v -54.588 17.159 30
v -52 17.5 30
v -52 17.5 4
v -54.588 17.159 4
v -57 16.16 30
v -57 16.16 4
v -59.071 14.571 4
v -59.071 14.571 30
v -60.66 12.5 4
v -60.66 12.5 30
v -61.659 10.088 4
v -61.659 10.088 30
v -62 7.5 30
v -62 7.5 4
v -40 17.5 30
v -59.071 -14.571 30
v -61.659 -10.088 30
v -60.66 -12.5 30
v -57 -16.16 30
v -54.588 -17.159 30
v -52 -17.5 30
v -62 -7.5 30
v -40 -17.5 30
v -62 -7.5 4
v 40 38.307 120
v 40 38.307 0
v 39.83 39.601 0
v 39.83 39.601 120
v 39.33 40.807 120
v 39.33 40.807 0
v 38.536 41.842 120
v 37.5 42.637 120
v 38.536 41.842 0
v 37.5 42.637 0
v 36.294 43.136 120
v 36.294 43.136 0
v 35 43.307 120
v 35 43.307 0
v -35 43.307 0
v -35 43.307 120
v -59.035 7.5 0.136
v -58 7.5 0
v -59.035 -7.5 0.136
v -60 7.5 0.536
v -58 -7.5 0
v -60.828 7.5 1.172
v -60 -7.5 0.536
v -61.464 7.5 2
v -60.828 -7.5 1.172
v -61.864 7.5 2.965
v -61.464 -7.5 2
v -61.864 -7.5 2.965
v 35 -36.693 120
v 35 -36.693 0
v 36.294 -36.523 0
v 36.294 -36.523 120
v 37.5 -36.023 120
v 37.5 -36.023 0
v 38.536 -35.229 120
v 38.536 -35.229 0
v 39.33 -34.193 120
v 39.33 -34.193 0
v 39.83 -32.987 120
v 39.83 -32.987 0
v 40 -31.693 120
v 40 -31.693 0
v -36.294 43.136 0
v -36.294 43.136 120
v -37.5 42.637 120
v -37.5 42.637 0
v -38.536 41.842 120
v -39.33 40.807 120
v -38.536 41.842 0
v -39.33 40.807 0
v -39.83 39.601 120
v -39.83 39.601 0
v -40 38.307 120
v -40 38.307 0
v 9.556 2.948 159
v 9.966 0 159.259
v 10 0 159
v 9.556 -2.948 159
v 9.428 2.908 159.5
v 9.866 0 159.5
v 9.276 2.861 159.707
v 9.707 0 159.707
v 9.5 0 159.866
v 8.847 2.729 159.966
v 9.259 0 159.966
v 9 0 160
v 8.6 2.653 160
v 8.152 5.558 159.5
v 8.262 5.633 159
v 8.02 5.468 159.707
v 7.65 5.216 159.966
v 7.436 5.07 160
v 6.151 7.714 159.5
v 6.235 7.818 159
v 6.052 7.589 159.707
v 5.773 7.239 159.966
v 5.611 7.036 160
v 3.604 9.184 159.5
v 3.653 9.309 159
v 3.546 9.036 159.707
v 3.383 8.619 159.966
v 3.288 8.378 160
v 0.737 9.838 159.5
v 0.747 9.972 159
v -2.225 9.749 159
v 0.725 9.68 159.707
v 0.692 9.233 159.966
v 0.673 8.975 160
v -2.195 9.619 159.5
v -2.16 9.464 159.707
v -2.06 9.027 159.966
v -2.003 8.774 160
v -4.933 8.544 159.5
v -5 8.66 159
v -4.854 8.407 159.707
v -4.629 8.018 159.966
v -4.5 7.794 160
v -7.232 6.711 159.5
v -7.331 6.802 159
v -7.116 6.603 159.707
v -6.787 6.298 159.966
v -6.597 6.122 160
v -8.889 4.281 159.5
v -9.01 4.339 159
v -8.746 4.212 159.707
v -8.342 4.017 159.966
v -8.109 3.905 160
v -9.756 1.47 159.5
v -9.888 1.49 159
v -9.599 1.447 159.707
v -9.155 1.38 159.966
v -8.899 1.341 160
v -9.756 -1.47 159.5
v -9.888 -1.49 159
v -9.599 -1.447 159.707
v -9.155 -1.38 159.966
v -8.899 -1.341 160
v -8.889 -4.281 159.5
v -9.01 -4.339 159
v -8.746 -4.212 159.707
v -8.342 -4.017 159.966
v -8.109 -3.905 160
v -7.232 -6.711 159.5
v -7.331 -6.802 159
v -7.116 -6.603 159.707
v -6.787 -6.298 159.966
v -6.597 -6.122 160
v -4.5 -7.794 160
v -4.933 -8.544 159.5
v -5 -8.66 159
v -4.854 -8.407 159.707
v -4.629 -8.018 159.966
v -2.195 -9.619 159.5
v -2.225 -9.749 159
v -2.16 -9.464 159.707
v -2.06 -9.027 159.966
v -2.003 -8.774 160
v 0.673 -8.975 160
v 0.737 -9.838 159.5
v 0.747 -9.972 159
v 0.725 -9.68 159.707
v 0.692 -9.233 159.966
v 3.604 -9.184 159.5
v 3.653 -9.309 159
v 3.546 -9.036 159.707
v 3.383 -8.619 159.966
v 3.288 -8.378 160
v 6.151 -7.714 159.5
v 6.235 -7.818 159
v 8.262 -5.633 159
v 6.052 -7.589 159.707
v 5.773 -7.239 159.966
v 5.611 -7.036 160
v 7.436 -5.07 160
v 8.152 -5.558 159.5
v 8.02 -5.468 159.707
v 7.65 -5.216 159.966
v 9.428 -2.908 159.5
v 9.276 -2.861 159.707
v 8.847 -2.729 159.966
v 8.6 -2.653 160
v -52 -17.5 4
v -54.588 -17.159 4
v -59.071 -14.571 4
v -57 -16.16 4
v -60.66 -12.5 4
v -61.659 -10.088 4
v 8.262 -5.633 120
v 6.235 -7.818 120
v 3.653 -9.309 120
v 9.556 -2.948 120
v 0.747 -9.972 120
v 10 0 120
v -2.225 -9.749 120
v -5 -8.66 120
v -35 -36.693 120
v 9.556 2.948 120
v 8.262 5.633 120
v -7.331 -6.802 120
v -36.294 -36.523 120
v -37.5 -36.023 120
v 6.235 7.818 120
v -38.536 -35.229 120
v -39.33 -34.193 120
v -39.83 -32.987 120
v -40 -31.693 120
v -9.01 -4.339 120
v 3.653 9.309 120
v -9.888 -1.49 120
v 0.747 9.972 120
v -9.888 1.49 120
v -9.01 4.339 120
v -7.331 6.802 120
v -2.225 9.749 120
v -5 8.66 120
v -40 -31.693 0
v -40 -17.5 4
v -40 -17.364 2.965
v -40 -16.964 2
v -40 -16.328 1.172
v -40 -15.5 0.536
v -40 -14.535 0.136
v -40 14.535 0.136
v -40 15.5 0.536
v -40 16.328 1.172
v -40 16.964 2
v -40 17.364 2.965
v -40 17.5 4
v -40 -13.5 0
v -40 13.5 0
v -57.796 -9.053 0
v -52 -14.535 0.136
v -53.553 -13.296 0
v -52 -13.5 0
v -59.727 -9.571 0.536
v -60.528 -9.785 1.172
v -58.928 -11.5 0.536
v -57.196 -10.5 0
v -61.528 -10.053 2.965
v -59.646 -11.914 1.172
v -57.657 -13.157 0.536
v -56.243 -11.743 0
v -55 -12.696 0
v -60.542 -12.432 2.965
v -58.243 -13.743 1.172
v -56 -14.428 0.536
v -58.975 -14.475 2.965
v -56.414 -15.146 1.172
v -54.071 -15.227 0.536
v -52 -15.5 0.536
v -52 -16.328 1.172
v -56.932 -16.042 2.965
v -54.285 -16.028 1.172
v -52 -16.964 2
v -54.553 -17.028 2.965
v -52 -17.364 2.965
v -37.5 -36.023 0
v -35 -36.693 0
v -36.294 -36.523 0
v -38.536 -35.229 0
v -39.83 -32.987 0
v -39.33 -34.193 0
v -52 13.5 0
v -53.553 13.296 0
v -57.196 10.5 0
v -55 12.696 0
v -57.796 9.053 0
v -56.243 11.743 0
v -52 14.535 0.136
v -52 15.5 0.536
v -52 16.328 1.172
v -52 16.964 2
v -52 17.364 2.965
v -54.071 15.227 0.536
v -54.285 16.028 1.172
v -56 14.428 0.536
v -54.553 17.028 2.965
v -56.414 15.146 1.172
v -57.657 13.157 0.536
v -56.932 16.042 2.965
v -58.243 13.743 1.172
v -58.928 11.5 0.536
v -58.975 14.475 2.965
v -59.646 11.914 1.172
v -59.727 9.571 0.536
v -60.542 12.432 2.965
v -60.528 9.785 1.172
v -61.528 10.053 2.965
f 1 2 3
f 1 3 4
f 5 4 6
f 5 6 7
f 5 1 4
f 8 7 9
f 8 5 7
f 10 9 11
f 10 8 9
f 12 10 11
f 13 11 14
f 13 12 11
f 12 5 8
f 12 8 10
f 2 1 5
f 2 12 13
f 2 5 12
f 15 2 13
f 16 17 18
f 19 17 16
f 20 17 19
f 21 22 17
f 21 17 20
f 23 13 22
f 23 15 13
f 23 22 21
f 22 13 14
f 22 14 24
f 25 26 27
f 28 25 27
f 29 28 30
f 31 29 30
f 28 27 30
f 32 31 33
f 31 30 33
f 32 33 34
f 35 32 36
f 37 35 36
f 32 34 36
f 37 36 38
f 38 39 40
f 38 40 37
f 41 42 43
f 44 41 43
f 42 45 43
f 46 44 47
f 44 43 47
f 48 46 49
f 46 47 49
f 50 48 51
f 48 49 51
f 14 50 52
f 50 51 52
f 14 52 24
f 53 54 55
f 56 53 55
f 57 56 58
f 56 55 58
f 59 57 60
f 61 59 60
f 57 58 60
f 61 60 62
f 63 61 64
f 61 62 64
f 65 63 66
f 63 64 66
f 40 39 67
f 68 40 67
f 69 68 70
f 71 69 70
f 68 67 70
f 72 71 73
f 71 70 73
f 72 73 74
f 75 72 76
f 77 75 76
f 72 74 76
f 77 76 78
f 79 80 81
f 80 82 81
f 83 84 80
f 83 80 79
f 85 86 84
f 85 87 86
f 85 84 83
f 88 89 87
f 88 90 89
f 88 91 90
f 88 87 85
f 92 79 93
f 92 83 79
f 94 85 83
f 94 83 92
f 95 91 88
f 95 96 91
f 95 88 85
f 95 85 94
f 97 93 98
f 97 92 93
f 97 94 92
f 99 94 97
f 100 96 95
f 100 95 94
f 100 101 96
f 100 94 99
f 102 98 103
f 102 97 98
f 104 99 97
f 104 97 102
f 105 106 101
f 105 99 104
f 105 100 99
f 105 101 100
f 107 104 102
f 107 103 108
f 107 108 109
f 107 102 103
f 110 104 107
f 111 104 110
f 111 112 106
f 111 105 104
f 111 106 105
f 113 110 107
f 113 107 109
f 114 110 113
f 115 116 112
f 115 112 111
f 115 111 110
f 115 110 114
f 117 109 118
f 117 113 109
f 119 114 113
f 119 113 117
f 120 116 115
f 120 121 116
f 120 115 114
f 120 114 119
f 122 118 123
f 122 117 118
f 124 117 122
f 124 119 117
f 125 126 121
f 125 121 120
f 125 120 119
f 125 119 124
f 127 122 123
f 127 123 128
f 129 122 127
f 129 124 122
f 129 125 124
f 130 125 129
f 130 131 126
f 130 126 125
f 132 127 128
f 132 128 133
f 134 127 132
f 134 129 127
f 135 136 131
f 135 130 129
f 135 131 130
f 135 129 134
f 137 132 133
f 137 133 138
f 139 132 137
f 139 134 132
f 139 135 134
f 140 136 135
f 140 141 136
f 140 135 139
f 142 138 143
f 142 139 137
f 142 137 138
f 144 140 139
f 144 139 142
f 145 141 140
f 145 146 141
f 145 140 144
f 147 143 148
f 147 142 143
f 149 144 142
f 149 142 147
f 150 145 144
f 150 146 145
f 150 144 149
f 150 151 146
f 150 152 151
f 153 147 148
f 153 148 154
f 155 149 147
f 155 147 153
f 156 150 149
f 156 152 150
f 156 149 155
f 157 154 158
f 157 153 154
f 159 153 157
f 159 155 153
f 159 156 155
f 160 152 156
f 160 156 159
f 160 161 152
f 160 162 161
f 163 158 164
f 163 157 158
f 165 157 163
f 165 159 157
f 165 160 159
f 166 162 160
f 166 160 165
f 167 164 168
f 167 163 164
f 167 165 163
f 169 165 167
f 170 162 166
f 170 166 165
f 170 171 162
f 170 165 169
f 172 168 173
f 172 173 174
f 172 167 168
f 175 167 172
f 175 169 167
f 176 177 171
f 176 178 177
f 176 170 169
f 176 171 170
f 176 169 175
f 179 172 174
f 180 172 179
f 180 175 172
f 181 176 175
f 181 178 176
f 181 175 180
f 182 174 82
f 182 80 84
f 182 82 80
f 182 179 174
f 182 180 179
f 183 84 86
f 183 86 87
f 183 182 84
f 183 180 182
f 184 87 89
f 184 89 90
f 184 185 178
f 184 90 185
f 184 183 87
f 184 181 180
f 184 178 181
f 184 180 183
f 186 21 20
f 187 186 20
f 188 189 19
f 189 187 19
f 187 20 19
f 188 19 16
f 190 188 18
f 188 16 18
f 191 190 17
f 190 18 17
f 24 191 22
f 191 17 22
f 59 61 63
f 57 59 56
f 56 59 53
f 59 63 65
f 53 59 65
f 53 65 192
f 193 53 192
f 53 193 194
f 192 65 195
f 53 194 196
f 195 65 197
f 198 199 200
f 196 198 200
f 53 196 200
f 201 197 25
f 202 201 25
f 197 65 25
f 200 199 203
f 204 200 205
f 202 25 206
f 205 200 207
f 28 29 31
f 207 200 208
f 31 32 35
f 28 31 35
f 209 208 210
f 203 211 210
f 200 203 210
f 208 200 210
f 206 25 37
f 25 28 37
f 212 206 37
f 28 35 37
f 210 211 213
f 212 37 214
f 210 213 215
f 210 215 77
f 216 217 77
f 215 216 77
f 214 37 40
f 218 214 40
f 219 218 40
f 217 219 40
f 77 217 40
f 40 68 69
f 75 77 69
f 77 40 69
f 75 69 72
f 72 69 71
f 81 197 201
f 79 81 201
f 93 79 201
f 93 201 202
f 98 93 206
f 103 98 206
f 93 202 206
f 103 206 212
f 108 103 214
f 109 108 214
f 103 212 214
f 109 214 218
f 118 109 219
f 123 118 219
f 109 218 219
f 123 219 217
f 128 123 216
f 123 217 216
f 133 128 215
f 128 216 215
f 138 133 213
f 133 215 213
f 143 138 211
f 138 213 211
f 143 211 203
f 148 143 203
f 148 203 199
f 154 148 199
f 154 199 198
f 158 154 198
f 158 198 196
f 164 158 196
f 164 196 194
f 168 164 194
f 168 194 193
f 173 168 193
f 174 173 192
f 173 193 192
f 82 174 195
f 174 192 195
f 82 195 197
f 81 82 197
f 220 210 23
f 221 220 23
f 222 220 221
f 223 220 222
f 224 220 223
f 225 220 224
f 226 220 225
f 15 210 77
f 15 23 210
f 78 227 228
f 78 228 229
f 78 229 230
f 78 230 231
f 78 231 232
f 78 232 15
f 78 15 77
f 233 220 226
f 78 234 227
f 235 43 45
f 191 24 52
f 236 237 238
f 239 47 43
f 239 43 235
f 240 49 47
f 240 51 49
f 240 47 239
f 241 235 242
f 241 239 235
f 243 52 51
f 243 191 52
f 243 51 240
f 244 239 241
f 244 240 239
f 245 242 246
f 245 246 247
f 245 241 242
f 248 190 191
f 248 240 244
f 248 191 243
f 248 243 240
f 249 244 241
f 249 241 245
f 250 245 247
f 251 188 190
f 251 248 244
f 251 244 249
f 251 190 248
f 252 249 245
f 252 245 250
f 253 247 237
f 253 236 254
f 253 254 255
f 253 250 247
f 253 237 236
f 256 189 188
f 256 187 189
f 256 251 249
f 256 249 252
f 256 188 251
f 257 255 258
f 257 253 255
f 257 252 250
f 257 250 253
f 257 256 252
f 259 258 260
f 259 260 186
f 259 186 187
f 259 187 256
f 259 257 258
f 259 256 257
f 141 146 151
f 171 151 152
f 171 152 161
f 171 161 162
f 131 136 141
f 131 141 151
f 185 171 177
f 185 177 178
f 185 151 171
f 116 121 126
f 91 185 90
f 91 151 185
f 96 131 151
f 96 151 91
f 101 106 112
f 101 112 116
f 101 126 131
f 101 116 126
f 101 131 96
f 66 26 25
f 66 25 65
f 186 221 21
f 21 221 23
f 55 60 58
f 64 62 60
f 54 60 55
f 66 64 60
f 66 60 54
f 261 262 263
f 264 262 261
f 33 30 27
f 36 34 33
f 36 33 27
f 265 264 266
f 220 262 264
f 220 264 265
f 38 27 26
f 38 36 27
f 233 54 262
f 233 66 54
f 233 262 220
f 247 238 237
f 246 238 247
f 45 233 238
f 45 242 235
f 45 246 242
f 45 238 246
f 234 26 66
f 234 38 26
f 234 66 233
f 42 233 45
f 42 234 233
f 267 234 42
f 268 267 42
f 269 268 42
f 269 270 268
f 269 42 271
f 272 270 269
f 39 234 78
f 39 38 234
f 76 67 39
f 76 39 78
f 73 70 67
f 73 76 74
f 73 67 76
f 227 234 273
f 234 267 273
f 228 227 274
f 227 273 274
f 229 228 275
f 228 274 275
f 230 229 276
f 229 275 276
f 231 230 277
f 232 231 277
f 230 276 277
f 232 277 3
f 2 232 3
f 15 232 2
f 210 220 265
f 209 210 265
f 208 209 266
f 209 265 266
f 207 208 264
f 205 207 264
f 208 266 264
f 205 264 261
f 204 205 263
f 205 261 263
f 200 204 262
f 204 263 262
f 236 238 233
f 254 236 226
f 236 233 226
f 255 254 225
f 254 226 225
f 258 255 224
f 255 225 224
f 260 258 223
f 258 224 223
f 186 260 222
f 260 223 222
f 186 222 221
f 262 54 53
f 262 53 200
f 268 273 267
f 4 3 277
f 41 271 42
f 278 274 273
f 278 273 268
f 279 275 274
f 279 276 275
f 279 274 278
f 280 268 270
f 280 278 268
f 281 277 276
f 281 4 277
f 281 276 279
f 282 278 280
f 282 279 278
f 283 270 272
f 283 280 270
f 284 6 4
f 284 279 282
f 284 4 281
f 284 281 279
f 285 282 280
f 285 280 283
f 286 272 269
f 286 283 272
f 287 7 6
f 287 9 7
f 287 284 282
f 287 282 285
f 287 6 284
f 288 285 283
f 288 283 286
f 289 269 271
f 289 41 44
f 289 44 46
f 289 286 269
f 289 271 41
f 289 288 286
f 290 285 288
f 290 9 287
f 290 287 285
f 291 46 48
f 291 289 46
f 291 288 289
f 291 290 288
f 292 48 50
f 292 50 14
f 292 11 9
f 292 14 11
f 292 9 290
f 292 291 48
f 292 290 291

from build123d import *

# Parameters (mm, degrees)
PAD_DEPTH    = 120
SKETCH001_R  = 10
PAD001_DEPTH = 40
FILLET_R     = 1
SKETCH002_W  = 35
SKETCH002_H  = 30
PAD002_DEPTH = 22
FILLET001_R  = 10
FILLET002_R  = 4


with BuildPart() as part:
    # Sketch → Pad (new body)
    with BuildSketch(Plane.XY):
        with BuildLine():
            Line((-35, 43.30686), (35, 43.30686))
            ThreePointArc((40, 38.30686), (38.535534, 41.842393), (35, 43.30686))
            Line((40, 38.30686), (40, -31.69314))
            ThreePointArc((35, -36.69314), (38.535534, -35.228674), (40, -31.69314))
            Line((35, -36.69314), (-35, -36.69314))
            ThreePointArc((-40, -31.69314), (-38.535534, -35.228674), (-35, -36.69314))
            Line((-40, -31.69314), (-40, 38.30686))
            ThreePointArc((-35, 43.30686), (-38.535534, 41.842393), (-40, 38.30686))
        make_face()
    extrude(amount=PAD_DEPTH)

    # Sketch001 (on Face10 of Pad) → Pad001 (join)
    with BuildSketch(Plane.XY.offset(120)):
        Circle(SKETCH001_R)
    extrude(amount=PAD001_DEPTH)

    # Fillet
    fillet_edges = [part.edges().sort_by_distance(p)[0] for p in [
        (-10, 0, 160),
    ]]
    fillet(fillet_edges, radius=FILLET_R)

    # Sketch002 (on Face8 of Fillet) → Pad002 (join)
    with BuildSketch(Plane(origin=(-40, 0, 0), x_dir=(0, -1, 0), z_dir=(-1, 0, 0))):
        with Locations((0, 15)):
            Rectangle(SKETCH002_W, SKETCH002_H)
    extrude(amount=PAD002_DEPTH)

    # Fillet001
    fillet001_edges = [part.edges().sort_by_distance(p)[0] for p in [
        (-62, 17.5, 15),
        (-62, -17.5, 15),
    ]]
    fillet(fillet001_edges, radius=FILLET001_R)

    # Fillet002
    fillet002_edges = [part.edges().sort_by_distance(p)[0] for p in [
        (-62, 0, 0),
    ]]
    fillet(fillet002_edges, radius=FILLET002_R)


solid = part.part
